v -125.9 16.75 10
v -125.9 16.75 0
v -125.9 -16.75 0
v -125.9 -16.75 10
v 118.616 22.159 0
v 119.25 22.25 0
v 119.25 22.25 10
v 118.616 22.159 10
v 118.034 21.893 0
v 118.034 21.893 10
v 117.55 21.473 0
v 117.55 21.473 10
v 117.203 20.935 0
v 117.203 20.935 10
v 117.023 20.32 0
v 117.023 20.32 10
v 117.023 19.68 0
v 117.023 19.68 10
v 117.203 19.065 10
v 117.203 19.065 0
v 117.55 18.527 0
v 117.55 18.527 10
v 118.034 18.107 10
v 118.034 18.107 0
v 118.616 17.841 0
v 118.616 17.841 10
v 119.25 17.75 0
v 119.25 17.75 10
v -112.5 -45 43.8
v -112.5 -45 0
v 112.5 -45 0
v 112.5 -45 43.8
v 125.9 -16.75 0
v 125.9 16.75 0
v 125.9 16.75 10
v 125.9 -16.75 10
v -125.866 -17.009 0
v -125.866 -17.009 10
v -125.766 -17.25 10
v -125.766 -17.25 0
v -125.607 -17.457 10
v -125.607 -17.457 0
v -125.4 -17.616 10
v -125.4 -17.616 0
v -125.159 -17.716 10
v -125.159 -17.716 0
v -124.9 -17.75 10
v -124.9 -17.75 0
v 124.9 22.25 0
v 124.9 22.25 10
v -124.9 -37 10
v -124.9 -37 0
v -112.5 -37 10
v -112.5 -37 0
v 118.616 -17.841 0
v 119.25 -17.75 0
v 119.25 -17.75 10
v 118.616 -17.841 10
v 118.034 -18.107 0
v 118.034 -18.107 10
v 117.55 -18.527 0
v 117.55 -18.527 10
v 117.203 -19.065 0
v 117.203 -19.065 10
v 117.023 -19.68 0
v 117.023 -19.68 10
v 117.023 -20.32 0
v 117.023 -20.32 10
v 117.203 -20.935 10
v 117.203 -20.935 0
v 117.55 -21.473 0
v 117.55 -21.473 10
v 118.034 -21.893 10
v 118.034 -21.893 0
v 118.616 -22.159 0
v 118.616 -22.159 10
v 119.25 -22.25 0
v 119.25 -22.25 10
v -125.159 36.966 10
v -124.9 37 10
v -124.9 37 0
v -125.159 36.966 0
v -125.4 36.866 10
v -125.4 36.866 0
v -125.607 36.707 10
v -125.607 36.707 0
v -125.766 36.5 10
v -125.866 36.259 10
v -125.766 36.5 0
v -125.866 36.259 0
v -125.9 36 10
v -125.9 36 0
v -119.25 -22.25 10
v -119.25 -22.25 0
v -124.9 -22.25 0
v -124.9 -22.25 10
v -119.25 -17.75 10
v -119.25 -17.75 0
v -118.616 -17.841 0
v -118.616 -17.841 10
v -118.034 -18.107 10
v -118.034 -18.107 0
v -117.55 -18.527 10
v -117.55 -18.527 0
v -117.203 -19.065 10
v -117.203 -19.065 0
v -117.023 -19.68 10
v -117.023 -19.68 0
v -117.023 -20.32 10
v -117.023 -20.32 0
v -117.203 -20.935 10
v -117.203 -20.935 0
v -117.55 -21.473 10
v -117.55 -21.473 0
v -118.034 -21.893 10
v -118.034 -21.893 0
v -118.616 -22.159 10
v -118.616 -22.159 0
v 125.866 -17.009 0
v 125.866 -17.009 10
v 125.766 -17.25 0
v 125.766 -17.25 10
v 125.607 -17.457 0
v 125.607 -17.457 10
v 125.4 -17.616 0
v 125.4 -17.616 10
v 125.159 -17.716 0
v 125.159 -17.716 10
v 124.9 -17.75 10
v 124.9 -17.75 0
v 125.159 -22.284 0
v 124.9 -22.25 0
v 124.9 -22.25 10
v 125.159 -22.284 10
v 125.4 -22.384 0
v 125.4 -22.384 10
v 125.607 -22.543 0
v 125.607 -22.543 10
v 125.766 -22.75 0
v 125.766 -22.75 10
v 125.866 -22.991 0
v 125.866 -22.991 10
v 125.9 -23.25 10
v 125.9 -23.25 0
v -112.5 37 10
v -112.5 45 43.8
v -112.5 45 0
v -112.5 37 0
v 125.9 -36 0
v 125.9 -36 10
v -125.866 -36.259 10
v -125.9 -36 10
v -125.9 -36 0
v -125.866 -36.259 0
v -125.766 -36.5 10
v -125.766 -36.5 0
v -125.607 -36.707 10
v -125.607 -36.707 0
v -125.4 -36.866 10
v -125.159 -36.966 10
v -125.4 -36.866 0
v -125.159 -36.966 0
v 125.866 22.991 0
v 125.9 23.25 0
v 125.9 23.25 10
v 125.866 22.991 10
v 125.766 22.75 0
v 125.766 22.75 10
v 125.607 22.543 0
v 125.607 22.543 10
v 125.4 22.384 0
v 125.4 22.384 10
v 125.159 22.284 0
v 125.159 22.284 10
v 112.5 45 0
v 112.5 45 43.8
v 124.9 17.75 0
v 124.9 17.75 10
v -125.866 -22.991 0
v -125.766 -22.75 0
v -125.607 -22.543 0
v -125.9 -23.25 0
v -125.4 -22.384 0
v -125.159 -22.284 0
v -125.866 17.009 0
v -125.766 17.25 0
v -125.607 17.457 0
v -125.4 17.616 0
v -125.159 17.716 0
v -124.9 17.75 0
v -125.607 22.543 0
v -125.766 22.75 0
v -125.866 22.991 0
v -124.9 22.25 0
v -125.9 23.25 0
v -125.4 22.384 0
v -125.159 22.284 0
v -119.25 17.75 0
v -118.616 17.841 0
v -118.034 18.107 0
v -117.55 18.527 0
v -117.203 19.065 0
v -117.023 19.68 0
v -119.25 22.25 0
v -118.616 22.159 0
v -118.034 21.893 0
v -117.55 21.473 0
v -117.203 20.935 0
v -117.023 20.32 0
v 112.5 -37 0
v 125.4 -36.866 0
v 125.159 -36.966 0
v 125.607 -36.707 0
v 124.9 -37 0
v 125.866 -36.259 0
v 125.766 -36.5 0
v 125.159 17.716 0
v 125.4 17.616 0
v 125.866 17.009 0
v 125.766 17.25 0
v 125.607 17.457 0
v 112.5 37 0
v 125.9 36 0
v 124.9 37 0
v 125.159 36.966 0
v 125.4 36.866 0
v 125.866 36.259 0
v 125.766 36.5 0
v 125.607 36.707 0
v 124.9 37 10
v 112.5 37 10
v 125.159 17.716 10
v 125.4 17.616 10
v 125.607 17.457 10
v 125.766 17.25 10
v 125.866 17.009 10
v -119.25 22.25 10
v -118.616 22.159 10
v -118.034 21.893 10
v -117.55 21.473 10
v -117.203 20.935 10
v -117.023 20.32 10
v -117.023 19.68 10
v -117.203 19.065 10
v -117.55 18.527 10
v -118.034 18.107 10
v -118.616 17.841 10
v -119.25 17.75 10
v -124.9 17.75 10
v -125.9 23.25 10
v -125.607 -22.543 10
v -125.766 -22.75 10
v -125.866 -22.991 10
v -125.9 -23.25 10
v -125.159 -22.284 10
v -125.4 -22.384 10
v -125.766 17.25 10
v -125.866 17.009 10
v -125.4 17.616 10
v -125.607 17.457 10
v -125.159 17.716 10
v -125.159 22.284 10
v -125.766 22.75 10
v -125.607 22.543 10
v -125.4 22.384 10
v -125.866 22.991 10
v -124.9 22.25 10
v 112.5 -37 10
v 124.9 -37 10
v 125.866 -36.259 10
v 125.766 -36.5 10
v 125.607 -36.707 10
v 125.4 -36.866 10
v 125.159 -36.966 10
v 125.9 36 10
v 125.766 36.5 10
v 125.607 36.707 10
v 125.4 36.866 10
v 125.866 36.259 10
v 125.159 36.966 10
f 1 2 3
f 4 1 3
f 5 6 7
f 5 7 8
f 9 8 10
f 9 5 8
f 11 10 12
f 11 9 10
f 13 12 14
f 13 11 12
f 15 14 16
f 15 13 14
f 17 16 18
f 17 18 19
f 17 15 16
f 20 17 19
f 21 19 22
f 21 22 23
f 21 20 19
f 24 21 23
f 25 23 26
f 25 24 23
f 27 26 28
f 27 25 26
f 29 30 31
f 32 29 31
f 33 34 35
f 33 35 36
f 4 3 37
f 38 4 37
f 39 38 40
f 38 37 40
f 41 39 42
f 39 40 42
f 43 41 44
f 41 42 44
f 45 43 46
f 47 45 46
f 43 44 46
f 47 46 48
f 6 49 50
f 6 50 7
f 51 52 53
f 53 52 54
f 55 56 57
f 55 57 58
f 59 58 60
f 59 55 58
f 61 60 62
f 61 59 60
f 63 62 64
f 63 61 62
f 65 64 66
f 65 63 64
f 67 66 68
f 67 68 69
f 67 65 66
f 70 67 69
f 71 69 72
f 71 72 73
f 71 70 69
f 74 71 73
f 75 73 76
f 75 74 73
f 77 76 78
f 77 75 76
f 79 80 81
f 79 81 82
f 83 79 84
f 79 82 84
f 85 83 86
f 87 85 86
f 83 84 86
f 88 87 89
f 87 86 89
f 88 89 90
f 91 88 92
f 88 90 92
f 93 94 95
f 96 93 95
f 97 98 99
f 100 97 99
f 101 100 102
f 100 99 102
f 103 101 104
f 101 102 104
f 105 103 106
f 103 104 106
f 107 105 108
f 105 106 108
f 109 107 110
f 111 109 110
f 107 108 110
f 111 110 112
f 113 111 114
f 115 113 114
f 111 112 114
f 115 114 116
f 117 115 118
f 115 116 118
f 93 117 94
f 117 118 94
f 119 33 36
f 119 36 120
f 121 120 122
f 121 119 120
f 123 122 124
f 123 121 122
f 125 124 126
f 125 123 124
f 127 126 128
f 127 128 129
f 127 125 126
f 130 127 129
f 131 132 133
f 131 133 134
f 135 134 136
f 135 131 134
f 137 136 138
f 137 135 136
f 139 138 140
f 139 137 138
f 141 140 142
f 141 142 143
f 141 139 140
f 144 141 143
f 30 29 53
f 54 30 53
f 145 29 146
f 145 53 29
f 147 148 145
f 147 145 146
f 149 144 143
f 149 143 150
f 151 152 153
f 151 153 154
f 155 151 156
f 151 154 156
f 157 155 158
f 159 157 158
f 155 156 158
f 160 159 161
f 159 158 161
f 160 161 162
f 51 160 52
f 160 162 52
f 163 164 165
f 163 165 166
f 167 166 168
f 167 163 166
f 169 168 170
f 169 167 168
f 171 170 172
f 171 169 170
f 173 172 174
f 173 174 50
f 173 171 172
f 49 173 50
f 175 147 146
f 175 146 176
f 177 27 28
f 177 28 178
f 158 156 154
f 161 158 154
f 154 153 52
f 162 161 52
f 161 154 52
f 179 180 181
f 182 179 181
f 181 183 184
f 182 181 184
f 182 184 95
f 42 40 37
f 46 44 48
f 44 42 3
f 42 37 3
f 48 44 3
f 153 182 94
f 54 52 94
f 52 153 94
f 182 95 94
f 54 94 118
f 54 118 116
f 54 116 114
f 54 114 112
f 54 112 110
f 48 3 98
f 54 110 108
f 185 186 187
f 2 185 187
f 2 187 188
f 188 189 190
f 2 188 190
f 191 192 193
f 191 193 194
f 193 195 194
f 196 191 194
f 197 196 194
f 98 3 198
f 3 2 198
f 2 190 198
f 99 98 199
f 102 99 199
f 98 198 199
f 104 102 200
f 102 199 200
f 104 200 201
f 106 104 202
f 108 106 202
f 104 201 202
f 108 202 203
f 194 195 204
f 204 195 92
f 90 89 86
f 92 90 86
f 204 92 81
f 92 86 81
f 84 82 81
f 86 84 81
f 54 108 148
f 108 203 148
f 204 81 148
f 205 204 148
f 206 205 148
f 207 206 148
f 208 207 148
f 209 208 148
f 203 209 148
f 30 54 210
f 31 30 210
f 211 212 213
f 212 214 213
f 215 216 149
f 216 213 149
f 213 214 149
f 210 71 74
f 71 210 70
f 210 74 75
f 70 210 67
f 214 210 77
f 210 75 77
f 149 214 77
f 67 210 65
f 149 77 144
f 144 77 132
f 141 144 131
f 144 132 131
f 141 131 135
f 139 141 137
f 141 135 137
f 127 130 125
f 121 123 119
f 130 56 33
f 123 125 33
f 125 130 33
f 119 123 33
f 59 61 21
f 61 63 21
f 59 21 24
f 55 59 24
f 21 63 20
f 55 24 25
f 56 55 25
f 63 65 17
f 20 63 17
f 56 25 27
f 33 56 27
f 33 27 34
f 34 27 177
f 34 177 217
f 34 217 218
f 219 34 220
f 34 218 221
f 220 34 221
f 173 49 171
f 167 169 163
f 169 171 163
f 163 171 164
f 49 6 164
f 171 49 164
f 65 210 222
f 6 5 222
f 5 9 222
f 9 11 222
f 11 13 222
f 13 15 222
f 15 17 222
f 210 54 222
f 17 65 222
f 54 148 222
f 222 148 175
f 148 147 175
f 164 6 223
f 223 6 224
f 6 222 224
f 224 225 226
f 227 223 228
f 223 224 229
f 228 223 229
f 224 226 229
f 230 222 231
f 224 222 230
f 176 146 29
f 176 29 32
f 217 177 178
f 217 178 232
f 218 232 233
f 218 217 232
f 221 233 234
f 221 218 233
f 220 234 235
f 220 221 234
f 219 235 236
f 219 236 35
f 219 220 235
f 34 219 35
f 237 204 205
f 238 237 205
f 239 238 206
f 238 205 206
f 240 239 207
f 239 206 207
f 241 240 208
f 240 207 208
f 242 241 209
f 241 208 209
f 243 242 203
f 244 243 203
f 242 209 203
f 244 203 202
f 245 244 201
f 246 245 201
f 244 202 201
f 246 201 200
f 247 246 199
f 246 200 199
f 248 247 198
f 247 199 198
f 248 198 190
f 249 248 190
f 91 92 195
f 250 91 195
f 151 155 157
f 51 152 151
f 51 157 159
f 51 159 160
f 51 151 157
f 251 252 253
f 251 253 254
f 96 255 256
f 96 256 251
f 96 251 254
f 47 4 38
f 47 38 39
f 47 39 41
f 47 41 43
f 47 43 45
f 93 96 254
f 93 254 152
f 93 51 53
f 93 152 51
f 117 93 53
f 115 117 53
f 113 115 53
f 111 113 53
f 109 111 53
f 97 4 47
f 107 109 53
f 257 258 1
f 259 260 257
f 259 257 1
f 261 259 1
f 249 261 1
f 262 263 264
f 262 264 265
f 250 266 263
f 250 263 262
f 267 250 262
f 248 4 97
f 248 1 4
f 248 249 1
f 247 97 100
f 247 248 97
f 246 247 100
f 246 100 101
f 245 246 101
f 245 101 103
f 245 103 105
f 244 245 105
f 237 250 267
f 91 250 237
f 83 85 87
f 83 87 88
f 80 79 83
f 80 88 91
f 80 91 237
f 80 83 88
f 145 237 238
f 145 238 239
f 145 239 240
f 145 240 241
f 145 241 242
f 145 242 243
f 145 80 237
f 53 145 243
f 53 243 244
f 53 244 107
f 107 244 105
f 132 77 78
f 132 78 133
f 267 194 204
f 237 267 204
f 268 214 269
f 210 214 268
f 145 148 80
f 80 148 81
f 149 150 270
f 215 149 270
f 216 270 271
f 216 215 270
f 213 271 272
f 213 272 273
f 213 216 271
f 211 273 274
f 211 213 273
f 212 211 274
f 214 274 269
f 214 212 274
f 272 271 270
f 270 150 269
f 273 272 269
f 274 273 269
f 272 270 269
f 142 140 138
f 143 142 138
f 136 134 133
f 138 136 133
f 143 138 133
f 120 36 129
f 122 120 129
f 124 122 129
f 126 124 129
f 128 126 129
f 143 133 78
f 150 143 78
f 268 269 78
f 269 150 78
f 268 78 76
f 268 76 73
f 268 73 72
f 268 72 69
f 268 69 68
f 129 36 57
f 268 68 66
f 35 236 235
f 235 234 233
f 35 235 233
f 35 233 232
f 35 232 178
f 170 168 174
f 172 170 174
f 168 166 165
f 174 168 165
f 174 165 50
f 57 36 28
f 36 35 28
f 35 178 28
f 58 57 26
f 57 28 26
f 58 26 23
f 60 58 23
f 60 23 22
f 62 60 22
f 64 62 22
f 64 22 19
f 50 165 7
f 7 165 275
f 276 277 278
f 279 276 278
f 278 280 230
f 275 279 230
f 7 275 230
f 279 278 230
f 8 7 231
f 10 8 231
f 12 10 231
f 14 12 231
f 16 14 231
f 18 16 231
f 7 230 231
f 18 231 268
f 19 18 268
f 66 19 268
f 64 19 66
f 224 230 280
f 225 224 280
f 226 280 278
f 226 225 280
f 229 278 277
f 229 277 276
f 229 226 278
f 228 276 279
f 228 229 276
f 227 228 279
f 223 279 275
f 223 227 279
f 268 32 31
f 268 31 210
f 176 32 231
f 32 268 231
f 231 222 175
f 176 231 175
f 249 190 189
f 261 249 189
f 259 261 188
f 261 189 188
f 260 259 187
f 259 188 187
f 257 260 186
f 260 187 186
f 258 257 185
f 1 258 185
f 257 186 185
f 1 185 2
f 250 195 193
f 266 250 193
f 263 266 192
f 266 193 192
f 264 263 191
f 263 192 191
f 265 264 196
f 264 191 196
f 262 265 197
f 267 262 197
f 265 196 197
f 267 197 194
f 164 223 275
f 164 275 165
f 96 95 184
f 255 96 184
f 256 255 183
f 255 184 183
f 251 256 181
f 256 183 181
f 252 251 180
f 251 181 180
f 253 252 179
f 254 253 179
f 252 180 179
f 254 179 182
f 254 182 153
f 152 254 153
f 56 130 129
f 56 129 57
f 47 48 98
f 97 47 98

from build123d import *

# Parameters (mm, degrees)
SKETCH1_W           = 225
SKETCH1_H           = 90
BOSS_EXTRUDE1_DEPTH = 43.8
BOSS_EXTRUDE2_DEPTH = 10


with BuildPart() as part:
    # Sketch1 → Boss-Extrude1 (new body)
    with BuildSketch(Plane.XY):
        Rectangle(SKETCH1_W, SKETCH1_H)
    extrude(amount=BOSS_EXTRUDE1_DEPTH)

    # Sketch2 → Boss-Extrude2 (add)
    with BuildSketch(Plane.XY):
        with BuildLine():
            Line((-112.5, 37), (-124.9, 37))
            ThreePointArc((-124.9, 37), (-125.607106781, 36.707106781), (-125.9, 36))
            Line((-125.9, 36), (-125.9, 23.25))
            ThreePointArc((-125.9, 23.25), (-125.607106781, 22.542893219), (-124.9, 22.25))
            Line((-124.9, 22.25), (-119.25, 22.25))
            ThreePointArc((-119.25, 22.25), (-117, 20), (-119.25, 17.75))
            Line((-119.25, 17.75), (-124.9, 17.75))
            ThreePointArc((-124.9, 17.75), (-125.607106781, 17.457106781), (-125.9, 16.75))
            Line((-125.9, 16.75), (-125.9, -16.75))
            ThreePointArc((-125.9, -16.75), (-125.607106781, -17.457106781), (-124.9, -17.75))
            Line((-124.9, -17.75), (-119.25, -17.75))
            ThreePointArc((-119.25, -17.75), (-117, -20), (-119.25, -22.25))
            Line((-119.25, -22.25), (-124.9, -22.25))
            ThreePointArc((-124.9, -22.25), (-125.607106781, -22.542893219), (-125.9, -23.25))
            Line((-125.9, -23.25), (-125.9, -36))
            ThreePointArc((-125.9, -36), (-125.607106781, -36.707106781), (-124.9, -37))
            Line((-124.9, -37), (-112.5, -37))
            Line((-112.5, -37), (-112.5, 37))
        make_face()
    boss_extrude2 = extrude(amount=BOSS_EXTRUDE2_DEPTH)

    # Mirror1: Boss-Extrude2 across plane
    add(boss_extrude2.mirror(Plane(origin=(0, 0, 0), x_dir=(0, 0, 1), z_dir=(1, 0, 0))))


solid = part.part
